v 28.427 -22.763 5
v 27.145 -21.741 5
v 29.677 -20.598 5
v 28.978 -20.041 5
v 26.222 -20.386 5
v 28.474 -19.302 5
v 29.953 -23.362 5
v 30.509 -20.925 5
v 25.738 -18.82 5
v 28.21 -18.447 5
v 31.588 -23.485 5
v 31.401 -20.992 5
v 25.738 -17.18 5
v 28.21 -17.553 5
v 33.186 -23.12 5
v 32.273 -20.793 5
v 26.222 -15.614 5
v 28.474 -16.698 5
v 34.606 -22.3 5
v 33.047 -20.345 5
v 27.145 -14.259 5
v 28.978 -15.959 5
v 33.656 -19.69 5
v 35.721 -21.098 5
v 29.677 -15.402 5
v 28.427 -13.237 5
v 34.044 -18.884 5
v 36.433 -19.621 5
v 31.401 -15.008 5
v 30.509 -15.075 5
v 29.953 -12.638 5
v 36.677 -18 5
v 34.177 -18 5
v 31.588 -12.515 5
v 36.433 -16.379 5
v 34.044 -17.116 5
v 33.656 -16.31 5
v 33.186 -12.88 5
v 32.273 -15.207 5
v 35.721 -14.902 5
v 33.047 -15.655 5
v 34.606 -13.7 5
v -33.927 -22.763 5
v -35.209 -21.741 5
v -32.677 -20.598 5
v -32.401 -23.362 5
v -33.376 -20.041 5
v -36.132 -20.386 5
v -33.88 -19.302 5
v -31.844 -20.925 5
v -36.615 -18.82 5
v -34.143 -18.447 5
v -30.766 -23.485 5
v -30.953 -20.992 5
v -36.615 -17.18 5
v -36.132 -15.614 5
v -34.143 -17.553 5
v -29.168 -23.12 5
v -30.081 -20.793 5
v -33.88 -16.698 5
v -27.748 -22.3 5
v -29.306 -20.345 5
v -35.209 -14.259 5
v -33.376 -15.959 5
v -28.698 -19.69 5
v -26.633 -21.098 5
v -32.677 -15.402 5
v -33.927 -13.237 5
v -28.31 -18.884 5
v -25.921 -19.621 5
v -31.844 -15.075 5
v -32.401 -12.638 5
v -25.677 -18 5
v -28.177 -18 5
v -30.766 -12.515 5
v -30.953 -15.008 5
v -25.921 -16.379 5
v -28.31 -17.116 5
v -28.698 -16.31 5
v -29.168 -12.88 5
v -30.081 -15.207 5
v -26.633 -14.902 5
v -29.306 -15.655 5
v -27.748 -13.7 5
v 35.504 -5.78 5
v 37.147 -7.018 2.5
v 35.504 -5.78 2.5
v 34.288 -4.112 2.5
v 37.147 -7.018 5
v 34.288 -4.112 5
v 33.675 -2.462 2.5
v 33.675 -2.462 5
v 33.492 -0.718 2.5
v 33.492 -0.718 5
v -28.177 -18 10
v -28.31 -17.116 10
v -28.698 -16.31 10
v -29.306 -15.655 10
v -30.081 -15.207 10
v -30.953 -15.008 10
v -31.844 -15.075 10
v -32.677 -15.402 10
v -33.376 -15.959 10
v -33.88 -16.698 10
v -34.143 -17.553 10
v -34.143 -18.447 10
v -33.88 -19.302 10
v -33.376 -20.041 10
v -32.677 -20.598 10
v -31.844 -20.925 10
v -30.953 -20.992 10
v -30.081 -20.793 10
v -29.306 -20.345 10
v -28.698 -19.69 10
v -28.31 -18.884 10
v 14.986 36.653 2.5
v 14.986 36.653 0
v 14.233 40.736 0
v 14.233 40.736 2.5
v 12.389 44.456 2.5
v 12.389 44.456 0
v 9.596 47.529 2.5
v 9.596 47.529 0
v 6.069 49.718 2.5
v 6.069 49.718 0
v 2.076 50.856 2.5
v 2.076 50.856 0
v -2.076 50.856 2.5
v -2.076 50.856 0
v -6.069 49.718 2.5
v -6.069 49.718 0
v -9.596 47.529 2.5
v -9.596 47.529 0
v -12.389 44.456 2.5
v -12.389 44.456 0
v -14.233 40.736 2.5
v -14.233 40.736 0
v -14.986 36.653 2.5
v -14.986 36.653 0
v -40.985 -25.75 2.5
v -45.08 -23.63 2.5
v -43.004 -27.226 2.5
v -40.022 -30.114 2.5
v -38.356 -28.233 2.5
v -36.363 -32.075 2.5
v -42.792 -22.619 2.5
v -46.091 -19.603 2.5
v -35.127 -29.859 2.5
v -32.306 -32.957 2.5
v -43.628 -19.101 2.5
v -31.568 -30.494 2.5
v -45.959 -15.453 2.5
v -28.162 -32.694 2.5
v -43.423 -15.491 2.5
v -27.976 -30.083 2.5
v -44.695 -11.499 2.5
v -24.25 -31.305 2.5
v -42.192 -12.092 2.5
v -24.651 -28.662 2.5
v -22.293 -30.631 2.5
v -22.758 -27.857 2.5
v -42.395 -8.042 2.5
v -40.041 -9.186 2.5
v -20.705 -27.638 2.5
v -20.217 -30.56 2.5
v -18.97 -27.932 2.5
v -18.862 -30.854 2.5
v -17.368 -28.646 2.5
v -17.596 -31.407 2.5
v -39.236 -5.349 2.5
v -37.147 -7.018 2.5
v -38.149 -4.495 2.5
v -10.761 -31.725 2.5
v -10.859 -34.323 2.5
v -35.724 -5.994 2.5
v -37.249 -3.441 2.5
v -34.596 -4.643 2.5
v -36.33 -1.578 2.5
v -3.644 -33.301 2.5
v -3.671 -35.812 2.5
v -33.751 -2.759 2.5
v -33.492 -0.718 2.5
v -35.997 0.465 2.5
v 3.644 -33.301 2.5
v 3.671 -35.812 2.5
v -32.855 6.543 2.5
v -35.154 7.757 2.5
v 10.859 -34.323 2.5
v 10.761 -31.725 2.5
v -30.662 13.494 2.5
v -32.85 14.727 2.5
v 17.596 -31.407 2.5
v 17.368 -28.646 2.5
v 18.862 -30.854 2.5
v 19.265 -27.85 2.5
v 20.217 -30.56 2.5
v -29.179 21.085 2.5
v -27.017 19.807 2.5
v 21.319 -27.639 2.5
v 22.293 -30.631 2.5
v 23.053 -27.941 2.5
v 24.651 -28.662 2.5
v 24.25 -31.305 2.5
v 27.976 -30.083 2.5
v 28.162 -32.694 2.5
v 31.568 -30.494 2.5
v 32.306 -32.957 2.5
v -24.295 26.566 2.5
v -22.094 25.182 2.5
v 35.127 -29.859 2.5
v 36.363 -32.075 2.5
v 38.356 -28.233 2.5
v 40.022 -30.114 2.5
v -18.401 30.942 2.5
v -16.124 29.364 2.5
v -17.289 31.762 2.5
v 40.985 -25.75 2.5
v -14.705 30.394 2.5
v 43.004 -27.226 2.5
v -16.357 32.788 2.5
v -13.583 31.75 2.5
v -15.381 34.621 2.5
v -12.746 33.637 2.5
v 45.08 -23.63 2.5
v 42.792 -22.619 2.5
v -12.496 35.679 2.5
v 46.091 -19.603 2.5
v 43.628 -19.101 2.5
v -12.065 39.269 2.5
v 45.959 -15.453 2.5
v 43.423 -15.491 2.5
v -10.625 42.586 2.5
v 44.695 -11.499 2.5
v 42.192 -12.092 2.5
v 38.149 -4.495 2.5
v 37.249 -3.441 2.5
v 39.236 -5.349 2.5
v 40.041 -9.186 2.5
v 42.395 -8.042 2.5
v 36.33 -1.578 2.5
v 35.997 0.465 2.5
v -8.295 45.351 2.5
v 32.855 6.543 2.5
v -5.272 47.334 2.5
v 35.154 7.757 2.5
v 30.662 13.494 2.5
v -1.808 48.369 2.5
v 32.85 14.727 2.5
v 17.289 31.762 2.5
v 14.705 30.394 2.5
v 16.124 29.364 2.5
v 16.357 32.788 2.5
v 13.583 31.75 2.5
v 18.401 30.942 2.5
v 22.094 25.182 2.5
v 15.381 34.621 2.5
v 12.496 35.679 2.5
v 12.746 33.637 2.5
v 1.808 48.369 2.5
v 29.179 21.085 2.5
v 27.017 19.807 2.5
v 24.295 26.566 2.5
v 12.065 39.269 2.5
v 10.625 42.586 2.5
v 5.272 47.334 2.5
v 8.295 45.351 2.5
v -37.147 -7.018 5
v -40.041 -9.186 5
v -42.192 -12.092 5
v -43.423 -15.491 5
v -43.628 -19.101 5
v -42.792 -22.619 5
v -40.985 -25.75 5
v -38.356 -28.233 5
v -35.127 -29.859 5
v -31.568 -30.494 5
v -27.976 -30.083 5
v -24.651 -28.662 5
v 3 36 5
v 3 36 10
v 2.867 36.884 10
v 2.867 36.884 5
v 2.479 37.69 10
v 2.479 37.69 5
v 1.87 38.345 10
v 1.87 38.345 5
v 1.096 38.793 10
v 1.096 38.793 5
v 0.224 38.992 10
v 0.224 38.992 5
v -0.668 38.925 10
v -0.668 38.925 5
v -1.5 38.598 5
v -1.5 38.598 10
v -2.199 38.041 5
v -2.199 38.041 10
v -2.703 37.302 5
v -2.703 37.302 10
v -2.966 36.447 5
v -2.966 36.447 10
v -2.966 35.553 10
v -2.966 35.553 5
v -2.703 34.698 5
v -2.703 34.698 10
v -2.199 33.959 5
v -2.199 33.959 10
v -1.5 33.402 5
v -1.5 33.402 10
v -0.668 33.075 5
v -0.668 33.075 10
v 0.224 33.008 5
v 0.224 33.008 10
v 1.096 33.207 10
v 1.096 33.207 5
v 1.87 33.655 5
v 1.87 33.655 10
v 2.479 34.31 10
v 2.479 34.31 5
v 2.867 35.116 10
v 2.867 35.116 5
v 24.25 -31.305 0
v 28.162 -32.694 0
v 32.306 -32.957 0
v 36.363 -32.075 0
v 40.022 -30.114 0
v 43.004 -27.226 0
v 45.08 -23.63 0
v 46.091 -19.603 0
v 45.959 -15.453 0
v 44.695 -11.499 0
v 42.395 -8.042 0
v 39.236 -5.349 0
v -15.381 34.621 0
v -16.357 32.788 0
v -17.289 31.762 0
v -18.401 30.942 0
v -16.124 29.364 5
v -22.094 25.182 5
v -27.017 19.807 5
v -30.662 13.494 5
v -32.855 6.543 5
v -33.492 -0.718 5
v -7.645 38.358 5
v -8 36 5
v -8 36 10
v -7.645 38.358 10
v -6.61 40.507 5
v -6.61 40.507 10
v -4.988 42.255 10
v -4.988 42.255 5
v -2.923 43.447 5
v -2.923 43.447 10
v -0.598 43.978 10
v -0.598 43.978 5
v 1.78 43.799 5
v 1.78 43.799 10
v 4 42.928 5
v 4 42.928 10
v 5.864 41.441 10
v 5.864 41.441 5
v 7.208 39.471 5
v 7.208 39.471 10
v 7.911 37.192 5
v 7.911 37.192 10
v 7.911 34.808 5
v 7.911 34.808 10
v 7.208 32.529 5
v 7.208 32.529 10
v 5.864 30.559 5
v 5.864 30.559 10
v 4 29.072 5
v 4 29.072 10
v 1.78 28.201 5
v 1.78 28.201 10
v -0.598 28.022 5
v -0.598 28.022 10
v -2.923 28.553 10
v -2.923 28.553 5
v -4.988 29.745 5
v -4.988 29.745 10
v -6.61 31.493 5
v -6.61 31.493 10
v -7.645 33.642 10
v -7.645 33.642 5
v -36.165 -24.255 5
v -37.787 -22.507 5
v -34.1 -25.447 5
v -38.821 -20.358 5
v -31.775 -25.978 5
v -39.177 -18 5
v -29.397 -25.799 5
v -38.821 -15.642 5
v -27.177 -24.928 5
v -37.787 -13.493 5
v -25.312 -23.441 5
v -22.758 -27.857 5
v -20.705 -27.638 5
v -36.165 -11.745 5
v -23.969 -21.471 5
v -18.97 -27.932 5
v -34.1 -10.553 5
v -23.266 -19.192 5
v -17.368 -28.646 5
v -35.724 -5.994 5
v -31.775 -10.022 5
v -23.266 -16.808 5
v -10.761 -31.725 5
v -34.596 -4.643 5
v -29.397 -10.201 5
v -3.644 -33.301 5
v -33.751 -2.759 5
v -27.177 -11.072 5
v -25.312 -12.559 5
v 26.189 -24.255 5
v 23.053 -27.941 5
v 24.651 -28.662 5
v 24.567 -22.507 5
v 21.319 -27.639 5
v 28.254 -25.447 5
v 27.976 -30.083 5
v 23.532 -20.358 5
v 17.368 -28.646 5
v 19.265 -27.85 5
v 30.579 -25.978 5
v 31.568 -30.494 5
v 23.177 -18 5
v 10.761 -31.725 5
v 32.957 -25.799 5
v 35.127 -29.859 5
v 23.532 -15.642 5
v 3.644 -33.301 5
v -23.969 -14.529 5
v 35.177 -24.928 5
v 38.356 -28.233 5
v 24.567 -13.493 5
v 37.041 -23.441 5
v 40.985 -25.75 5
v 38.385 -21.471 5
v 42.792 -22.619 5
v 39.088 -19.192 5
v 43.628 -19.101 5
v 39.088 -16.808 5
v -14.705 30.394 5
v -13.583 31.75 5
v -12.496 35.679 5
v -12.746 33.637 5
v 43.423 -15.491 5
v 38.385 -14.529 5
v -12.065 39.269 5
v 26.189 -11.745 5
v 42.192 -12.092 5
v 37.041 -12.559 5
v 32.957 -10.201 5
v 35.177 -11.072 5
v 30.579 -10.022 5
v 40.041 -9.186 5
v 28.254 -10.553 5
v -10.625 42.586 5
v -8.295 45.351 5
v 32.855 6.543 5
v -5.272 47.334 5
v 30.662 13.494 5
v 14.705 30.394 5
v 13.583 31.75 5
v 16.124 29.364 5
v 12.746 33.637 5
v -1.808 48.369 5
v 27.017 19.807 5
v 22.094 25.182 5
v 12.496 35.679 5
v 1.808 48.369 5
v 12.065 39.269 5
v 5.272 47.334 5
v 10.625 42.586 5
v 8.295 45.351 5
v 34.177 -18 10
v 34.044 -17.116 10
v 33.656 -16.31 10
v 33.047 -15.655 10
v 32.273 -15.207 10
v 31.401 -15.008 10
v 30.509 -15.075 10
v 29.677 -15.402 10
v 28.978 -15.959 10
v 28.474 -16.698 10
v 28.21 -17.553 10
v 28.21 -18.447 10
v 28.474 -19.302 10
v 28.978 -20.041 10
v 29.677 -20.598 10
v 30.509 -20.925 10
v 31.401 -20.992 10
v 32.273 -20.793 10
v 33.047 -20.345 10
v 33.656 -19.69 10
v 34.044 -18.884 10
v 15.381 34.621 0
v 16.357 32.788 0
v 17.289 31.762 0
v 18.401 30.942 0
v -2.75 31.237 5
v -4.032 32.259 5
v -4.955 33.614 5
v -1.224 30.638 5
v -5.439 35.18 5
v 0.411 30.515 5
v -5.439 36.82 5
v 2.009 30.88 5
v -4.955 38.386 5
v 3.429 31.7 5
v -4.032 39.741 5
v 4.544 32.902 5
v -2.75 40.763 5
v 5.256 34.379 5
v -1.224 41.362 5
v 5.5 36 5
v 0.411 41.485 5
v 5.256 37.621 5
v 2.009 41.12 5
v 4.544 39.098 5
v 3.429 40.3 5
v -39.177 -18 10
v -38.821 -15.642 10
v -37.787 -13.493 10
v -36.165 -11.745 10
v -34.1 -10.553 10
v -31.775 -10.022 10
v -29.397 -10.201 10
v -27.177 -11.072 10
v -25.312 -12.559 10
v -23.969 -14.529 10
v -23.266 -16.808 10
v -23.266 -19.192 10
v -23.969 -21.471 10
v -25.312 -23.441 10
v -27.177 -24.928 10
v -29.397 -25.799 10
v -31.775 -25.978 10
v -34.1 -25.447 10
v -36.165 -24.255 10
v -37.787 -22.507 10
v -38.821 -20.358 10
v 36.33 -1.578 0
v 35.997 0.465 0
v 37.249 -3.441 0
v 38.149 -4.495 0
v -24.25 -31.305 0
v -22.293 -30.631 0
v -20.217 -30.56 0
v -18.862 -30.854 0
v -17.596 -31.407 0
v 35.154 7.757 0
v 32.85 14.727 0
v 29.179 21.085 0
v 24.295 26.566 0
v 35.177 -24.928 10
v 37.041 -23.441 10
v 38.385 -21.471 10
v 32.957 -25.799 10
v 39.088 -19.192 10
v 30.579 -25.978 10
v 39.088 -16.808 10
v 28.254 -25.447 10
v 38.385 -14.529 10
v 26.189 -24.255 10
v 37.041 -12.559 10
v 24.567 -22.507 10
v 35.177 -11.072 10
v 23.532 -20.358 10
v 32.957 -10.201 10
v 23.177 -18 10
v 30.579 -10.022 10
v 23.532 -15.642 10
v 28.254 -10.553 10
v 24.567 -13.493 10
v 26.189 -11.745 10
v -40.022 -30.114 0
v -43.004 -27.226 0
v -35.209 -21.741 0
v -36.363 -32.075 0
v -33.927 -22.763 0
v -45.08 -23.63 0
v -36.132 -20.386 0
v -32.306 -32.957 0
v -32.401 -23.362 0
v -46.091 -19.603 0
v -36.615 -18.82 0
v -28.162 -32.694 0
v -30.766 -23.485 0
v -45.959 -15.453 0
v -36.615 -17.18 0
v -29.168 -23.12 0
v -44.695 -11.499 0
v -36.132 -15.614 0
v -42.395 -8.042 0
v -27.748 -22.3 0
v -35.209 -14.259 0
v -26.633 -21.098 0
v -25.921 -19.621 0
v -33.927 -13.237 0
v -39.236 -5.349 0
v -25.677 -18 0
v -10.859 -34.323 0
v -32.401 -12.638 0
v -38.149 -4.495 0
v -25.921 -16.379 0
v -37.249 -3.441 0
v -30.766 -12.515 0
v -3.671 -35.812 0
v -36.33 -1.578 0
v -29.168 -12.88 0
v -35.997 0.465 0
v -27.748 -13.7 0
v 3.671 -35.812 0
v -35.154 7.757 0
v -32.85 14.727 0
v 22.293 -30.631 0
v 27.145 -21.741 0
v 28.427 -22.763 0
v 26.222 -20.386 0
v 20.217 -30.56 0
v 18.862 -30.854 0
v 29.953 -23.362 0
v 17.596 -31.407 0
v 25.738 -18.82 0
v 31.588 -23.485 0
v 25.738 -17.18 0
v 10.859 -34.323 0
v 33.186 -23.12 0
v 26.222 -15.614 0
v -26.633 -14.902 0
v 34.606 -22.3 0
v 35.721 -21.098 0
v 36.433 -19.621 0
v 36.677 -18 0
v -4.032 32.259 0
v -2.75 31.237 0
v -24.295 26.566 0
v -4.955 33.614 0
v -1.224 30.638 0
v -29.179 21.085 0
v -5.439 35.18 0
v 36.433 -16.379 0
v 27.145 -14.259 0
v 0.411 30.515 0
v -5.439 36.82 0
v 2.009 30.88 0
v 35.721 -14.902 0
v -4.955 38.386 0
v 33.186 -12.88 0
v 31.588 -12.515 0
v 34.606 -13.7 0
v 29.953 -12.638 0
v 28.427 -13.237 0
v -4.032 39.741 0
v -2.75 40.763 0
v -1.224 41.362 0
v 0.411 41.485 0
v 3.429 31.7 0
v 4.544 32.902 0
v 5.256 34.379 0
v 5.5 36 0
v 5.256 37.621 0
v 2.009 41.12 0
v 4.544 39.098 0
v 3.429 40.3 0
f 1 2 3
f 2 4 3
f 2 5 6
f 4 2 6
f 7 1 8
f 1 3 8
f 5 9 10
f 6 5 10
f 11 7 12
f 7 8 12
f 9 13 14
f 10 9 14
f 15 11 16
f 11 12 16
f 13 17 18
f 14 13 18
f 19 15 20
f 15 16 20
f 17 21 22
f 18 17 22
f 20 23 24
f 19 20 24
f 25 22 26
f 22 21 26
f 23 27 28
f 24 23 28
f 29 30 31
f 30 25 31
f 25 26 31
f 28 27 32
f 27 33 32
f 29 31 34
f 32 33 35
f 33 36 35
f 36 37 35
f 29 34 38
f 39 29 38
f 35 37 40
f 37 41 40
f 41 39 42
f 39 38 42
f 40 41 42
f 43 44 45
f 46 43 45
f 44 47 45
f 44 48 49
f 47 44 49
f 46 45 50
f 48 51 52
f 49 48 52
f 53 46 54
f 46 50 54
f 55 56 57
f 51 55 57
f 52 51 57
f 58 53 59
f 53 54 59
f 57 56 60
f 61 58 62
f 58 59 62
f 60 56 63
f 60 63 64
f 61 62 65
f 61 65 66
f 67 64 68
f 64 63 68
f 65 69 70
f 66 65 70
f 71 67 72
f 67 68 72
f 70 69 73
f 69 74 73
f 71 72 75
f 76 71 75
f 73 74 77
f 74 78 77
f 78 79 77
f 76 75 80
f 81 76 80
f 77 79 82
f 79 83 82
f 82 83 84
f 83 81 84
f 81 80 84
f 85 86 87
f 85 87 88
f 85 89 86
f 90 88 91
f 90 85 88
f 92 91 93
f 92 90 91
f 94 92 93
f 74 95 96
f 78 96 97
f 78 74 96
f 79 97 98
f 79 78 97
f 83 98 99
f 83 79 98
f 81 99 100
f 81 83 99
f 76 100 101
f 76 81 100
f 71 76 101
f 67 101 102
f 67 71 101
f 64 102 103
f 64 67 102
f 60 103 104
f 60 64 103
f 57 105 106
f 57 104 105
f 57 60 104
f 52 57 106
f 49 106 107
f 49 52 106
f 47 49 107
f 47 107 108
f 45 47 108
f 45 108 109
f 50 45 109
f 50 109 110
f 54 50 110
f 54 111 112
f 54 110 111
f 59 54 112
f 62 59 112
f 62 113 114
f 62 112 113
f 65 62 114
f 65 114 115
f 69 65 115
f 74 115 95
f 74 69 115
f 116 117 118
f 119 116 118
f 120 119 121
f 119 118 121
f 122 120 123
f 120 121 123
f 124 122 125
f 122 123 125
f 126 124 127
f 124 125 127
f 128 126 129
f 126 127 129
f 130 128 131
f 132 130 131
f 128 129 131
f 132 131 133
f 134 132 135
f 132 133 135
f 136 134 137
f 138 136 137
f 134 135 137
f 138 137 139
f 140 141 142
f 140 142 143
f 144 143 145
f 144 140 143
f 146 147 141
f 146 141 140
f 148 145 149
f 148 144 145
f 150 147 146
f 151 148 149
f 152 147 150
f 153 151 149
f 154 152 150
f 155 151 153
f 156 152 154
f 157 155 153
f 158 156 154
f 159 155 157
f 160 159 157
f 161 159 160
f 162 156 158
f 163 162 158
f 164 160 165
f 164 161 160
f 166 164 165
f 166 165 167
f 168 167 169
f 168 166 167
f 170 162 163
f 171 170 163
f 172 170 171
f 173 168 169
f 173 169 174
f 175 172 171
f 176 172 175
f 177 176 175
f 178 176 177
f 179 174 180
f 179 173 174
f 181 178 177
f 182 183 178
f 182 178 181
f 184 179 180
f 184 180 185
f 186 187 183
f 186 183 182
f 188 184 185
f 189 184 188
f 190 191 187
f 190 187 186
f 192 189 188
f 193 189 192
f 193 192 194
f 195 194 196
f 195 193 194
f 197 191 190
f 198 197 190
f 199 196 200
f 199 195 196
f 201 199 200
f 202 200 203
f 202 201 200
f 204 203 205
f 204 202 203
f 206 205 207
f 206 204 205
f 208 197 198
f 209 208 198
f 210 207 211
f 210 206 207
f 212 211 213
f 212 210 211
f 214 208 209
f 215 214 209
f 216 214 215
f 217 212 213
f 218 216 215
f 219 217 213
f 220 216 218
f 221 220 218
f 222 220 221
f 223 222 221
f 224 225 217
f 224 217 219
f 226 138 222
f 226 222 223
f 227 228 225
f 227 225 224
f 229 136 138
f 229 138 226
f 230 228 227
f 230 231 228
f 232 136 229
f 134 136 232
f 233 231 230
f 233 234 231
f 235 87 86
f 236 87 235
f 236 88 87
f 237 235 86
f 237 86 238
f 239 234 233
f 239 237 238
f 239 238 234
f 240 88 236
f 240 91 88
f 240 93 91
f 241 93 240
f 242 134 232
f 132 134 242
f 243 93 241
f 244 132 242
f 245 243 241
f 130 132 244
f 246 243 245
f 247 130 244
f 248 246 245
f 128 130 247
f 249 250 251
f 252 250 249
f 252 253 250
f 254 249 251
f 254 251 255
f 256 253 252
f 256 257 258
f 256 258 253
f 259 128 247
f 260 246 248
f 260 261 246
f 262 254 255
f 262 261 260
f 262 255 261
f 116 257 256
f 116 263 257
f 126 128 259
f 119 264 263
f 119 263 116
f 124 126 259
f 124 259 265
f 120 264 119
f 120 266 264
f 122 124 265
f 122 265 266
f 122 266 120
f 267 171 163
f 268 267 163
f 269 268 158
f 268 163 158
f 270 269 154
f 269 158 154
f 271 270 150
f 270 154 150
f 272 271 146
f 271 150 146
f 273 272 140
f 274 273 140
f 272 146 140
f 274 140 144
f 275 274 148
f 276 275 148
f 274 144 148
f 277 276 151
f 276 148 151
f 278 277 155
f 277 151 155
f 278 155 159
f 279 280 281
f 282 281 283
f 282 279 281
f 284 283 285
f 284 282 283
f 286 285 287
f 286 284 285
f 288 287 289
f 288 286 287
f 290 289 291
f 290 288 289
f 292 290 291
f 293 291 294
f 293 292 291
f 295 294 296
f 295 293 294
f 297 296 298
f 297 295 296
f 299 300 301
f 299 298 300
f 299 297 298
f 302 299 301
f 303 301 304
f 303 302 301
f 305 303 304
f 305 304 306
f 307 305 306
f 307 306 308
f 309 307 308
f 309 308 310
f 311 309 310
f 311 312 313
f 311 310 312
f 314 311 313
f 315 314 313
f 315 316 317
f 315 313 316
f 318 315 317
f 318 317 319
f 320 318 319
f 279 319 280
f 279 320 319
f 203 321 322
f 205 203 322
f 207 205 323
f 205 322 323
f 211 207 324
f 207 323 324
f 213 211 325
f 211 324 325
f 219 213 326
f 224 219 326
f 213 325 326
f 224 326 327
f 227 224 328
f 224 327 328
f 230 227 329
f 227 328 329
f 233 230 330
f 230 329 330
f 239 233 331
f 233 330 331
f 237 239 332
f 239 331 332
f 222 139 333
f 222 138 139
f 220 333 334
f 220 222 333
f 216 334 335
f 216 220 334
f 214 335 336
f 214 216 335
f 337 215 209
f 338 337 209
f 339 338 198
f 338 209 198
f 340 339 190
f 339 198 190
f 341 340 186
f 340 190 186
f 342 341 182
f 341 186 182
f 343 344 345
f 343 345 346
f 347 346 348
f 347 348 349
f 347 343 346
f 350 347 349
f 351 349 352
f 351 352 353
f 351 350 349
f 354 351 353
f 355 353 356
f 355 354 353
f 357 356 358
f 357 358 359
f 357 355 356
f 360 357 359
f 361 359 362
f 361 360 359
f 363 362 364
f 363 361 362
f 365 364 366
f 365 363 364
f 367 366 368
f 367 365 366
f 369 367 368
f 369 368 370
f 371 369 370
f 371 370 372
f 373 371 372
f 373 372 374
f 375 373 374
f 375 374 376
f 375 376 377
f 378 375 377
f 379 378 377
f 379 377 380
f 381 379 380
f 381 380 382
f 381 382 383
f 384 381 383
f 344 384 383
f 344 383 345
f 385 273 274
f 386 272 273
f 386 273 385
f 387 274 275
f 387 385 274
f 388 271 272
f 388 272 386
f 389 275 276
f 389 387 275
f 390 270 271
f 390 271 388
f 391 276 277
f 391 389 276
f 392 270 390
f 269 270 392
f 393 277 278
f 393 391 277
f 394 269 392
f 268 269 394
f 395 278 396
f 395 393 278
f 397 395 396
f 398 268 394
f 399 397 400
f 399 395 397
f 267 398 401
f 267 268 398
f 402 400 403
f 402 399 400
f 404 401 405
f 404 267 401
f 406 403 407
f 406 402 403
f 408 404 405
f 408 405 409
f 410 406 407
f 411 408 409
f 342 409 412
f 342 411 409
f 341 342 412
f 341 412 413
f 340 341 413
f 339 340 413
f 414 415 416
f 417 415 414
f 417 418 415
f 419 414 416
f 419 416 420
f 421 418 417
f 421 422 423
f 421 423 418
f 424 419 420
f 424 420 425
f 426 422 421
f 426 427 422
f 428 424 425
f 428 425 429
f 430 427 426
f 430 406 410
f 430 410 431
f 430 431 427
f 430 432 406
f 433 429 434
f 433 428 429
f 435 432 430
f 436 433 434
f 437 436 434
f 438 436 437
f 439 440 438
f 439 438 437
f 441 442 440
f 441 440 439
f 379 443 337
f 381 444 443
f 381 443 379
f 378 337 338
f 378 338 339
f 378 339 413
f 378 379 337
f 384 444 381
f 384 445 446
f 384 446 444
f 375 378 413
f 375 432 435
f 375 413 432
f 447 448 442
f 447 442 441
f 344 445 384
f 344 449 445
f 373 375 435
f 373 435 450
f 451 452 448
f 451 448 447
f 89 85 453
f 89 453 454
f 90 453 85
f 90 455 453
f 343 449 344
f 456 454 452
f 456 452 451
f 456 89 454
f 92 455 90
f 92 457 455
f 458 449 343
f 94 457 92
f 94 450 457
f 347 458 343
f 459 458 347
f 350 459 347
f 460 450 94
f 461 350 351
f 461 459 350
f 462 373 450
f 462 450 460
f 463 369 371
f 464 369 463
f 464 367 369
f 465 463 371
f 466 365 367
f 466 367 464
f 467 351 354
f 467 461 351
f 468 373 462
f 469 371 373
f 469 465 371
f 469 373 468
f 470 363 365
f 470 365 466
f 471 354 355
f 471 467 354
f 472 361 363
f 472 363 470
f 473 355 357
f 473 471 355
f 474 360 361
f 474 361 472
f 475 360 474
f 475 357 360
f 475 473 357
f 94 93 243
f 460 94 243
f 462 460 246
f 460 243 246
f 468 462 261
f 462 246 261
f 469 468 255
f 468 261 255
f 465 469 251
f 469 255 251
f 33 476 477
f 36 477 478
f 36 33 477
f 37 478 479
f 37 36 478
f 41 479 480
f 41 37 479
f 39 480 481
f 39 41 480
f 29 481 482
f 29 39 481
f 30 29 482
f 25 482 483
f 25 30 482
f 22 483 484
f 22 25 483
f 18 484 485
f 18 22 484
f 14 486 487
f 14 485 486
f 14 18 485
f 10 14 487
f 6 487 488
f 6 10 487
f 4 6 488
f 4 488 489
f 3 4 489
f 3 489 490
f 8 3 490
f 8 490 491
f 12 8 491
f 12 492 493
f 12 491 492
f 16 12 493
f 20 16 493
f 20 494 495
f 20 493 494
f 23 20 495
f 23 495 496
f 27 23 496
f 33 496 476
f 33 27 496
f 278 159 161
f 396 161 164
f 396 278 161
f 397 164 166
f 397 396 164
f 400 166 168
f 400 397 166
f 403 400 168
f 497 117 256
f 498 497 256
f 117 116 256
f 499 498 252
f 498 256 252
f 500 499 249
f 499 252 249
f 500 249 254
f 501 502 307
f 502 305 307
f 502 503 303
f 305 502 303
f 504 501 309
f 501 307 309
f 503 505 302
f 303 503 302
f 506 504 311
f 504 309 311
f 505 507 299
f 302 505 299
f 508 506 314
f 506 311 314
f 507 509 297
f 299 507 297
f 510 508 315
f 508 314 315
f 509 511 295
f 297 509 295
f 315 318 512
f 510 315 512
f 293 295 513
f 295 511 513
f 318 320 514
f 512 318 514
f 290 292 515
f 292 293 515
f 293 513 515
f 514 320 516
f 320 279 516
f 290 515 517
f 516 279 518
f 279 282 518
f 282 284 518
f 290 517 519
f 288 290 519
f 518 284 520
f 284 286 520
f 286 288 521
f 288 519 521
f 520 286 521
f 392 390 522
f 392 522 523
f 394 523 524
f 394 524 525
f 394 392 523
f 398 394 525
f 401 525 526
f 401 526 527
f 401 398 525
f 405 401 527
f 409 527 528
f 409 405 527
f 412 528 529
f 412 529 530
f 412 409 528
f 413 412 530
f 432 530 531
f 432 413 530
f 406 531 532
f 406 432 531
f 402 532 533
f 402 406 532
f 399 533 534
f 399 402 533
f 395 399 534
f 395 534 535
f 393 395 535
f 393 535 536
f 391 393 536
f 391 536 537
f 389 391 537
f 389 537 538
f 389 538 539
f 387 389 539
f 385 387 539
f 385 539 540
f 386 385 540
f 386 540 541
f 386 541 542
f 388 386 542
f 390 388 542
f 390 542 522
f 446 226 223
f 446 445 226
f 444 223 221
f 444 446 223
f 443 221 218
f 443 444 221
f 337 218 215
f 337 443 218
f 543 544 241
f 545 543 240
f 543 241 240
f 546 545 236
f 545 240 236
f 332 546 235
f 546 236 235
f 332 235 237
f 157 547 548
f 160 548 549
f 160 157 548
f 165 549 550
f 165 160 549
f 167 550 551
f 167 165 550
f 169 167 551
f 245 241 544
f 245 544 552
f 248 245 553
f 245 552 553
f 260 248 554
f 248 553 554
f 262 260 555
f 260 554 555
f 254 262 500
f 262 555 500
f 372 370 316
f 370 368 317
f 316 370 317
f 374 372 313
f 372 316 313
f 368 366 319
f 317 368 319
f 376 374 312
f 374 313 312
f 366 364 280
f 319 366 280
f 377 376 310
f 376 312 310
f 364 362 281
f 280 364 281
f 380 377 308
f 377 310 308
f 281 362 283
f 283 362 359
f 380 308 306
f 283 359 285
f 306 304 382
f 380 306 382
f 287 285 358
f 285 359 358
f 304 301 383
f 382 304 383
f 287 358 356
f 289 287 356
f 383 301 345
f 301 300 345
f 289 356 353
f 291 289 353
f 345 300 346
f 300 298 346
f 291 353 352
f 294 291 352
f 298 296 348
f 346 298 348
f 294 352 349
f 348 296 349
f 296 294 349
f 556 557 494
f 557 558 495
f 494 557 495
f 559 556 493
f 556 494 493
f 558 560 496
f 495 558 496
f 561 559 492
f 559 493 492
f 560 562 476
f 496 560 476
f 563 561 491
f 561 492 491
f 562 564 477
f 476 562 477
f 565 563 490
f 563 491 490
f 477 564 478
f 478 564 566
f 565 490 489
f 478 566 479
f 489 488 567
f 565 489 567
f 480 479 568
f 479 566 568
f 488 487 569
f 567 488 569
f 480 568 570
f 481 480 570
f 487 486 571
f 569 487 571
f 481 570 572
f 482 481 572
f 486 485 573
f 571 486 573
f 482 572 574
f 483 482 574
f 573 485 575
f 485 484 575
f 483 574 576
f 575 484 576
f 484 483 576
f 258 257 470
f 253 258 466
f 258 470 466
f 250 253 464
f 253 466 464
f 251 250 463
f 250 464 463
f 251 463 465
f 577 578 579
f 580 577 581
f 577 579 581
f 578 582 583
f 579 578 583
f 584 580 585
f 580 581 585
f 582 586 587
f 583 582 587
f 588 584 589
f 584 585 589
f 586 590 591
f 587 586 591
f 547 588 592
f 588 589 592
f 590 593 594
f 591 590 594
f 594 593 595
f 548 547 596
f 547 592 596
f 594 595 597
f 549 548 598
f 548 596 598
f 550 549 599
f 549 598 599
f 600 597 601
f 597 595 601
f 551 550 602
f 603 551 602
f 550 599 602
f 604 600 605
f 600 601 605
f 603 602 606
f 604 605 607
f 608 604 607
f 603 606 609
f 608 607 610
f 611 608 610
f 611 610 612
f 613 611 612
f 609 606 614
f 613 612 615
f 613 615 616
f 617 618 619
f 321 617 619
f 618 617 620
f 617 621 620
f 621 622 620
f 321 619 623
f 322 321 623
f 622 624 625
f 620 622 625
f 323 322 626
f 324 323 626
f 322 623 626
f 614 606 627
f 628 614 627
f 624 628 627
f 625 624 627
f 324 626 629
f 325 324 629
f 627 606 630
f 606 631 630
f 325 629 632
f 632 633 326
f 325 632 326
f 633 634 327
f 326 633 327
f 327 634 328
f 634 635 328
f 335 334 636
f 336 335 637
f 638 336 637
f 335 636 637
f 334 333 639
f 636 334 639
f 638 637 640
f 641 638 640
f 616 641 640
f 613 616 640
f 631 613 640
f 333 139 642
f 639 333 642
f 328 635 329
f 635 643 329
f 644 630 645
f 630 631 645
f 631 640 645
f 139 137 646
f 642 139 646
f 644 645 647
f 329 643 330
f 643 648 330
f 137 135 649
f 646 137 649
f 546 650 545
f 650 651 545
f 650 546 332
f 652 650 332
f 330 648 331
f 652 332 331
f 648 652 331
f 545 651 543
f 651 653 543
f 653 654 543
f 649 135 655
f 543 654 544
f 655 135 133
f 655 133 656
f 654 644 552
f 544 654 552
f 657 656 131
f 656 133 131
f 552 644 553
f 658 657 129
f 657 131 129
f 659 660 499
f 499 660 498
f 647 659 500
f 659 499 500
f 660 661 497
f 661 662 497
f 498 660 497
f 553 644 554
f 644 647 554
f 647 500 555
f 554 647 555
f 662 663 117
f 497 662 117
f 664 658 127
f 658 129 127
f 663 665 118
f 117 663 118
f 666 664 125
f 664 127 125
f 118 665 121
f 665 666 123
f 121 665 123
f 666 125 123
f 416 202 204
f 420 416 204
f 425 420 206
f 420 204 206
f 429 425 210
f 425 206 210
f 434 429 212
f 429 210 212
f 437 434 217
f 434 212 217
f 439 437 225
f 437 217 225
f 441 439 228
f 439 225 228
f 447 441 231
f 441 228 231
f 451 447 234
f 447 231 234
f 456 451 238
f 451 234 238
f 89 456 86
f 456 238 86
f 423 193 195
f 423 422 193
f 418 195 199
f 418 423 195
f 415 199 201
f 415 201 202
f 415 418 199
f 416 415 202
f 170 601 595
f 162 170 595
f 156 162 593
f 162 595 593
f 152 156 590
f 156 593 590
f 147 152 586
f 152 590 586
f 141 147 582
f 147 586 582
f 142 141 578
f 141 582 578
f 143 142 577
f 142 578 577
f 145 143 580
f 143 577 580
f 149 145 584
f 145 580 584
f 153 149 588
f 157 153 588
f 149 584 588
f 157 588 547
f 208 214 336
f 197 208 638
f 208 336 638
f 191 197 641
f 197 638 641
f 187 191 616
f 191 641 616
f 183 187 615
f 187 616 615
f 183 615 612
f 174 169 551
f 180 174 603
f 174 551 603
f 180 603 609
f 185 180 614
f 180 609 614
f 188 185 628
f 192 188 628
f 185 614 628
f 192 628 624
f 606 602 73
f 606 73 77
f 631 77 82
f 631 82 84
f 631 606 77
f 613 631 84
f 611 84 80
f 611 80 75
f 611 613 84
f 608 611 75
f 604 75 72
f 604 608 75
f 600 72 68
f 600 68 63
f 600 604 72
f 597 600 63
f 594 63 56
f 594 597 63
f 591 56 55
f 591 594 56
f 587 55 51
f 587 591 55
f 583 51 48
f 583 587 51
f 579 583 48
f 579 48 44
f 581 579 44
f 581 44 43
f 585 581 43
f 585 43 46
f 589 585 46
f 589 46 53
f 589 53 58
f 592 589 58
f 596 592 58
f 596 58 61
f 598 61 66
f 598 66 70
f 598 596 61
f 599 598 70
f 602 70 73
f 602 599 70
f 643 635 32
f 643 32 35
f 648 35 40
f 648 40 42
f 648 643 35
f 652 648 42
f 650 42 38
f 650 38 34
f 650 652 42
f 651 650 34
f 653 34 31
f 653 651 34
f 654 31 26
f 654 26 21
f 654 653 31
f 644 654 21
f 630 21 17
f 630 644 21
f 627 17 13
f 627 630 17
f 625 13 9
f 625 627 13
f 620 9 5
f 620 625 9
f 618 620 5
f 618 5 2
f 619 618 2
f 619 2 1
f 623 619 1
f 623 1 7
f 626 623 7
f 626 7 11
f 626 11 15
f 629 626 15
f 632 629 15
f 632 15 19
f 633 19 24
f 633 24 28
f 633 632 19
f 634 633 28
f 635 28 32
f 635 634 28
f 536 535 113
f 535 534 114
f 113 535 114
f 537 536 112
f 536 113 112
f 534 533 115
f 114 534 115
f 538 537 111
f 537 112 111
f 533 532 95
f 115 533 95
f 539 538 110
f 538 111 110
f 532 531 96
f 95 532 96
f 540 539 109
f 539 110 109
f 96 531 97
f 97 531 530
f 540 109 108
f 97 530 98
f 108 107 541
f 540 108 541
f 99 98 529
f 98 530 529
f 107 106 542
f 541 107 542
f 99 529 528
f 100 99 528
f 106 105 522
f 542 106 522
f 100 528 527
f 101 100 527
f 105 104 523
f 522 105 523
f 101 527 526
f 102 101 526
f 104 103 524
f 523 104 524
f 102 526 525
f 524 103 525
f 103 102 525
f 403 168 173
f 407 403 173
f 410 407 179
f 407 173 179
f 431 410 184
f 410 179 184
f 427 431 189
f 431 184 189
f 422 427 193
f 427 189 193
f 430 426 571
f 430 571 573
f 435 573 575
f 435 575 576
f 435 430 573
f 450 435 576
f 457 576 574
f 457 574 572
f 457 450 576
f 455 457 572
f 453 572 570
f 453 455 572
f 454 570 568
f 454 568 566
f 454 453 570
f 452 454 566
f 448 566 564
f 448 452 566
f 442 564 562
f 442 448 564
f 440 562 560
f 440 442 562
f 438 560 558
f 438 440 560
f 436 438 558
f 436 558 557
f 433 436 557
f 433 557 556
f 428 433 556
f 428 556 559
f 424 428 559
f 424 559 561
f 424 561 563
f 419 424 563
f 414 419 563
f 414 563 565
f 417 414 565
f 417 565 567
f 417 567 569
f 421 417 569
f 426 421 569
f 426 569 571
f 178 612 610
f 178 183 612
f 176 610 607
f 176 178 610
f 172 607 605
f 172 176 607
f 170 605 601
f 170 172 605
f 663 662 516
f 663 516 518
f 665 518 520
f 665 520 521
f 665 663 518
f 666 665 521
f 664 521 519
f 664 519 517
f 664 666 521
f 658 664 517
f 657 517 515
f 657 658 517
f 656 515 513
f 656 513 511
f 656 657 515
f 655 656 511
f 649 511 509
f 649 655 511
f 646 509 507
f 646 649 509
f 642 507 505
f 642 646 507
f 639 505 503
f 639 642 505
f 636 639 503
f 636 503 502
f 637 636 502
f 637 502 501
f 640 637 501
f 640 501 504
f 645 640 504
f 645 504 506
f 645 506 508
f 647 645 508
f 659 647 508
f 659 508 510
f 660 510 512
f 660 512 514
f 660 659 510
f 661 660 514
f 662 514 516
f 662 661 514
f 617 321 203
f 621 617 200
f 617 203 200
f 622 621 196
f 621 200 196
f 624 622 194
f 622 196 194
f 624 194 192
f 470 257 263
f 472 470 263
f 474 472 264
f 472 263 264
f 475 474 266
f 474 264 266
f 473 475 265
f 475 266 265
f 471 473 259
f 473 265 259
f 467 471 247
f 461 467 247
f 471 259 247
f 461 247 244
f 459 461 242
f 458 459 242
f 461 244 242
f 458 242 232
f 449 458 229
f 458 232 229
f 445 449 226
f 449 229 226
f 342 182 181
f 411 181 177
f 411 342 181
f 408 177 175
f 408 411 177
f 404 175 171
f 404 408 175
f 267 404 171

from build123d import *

# Parameters (mm, degrees)
SKETCH1_R           = 5.5
BOSS_EXTRUDE3_DEPTH = 2.5
SKETCH1_7_R         = 5.5
BOSS_EXTRUDE4_DEPTH = 5
SKETCH2_R           = 8
BOSS_EXTRUDE5_DEPTH = 10
SKETCH1_9_R         = 3
CUT_EXTRUDE2_DEPTH  = 70.521992463
SKETCH1_13_R        = 5.5
SKETCH1_13_R_2      = 3
CUT_EXTRUDE3_DEPTH  = 5
FILLET1_R           = 7


with BuildPart() as part:
    # Sketch1 → Boss-Extrude3 (new body)
    with BuildSketch(Plane.XY):
        with BuildLine():
            ThreePointArc((-35.806019271, -3.732155406), (-44.167295593, -25.5), (-21.135151028, -29.142844594))
            ThreePointArc((-21.135151028, -29.142844594), (0, -36), (21.135151028, -29.142844594))
            ThreePointArc((21.135151028, -29.142844594), (44.167295593, -25.5), (35.806019271, -3.732155406))
            ThreePointArc((35.806019271, -3.732155406), (31.176914536, 18), (14.670868243, 32.875))
            ThreePointArc((14.670868243, 32.875), (0, 51), (-14.670868243, 32.875))
            ThreePointArc((-14.670868243, 32.875), (-31.176914536, 18), (-35.806019271, -3.732155406))
        make_face()
        with Locations((-31.176914536, -18)):
            Circle(SKETCH1_R, mode=Mode.SUBTRACT)
        with Locations((31.176914536, -18)):
            Circle(SKETCH1_R, mode=Mode.SUBTRACT)
        with Locations((0, 36)):
            Circle(SKETCH1_R, mode=Mode.SUBTRACT)
    extrude(amount=BOSS_EXTRUDE3_DEPTH)

    # Sketch1<7> → Boss-Extrude4 (add)
    with BuildSketch(Plane.XY):
        with BuildLine():
            ThreePointArc((11.629404781, 31.416666667), (0, 48.5), (-11.629404781, 31.416666667))
            ThreePointArc((-11.629404781, 31.416666667), (-29.011851027, 16.75), (-33.022333826, -5.636973362))
            ThreePointArc((-33.022333826, -5.636973362), (-42.002232084, -24.25), (-21.392929045, -25.779693304))
            ThreePointArc((-21.392929045, -25.779693304), (0, -33.5), (21.392929045, -25.779693304))
            ThreePointArc((21.392929045, -25.779693304), (42.002232084, -24.25), (33.022333826, -5.636973362))
            ThreePointArc((33.022333826, -5.636973362), (29.011851027, 16.75), (11.629404781, 31.416666667))
        make_face()
        with Locations((-31.176914536, -18)):
            Circle(SKETCH1_7_R, mode=Mode.SUBTRACT)
        with Locations((31.176914536, -18)):
            Circle(SKETCH1_7_R, mode=Mode.SUBTRACT)
        with Locations((0, 36)):
            Circle(SKETCH1_7_R, mode=Mode.SUBTRACT)
    extrude(amount=BOSS_EXTRUDE4_DEPTH)

    # Sketch2 → Boss-Extrude5 (add)
    with BuildSketch(Plane(origin=(0, 0, 0), x_dir=(-1, 0, 0), z_dir=(0, 0, -1))):
        with Locations((0, 36)):
            Circle(SKETCH2_R)
        with Locations((-31.176914536, -18)):
            Circle(SKETCH2_R)
        with Locations((31.176914536, -18)):
            Circle(SKETCH2_R)
    extrude(amount=-BOSS_EXTRUDE5_DEPTH)

    # Sketch1<9> → Cut-Extrude2 (cut, through all)
    with BuildSketch(Plane.XY):
        with Locations((-31.176914536, -18)):
            Circle(SKETCH1_9_R)
        with Locations((0, 36)):
            Circle(SKETCH1_9_R)
        with Locations((31.176914536, -18)):
            Circle(SKETCH1_9_R)
    extrude(amount=CUT_EXTRUDE2_DEPTH, mode=Mode.SUBTRACT)

    # Sketch1<13> → Cut-Extrude3 (cut)
    # profile 1 of 3: a face of its own
    with BuildSketch(Plane.XY):
        with Locations((0, 36)):
            Circle(SKETCH1_13_R)
        with Locations((0, 36)):
            Circle(SKETCH1_13_R_2, mode=Mode.SUBTRACT)
    # profile 2 of 3: a face of its own
    with BuildSketch(Plane.XY):
        with Locations((31.176914536, -18)):
            Circle(SKETCH1_13_R)
        with Locations((31.176914536, -18)):
            Circle(SKETCH1_13_R_2, mode=Mode.SUBTRACT)
    # profile 3 of 3: a face of its own
    with BuildSketch(Plane.XY):
        with Locations((-31.176914536, -18)):
            Circle(SKETCH1_13_R)
        with Locations((-31.176914536, -18)):
            Circle(SKETCH1_13_R_2, mode=Mode.SUBTRACT)
    extrude(amount=CUT_EXTRUDE3_DEPTH, mode=Mode.SUBTRACT)

    # Fillet1
    fillet1_edges = [part.edges().sort_by_distance(p)[0] for p in [
        (35.806019271, -3.732155406, 1.25),
        (21.135151028, -29.142844594, 1.25),
        (-21.135151028, -29.142844594, 1.25),
        (-35.806019271, -3.732155406, 1.25),
        (-14.670868243, 32.875, 1.25),
        (14.670868243, 32.875, 1.25),
        (33.022333826, -5.636973362, 3.75),
        (21.392929045, -25.779693304, 3.75),
        (-21.392929045, -25.779693304, 3.75),
        (-33.022333826, -5.636973362, 3.75),
        (-11.629404781, 31.416666667, 3.75),
        (11.629404781, 31.416666667, 3.75),
    ]]
    fillet(fillet1_edges, radius=FILLET1_R)


solid = part.part
